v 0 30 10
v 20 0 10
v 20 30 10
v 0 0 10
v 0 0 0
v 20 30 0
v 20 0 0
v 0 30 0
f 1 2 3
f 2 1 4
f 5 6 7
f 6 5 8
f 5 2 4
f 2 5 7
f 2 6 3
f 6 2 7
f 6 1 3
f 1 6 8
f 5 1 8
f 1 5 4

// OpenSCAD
// Parametrik model sablonu — tum olculer burada, mm cinsinden.
// KURAL: kullanicinin verdigi olcuyu degistirme; eksik kritik olcuyu uydurma, sor.

// PARAM: ornek — gercek projede kullanicinin olculeriyle degistir.
ornek_genislik = 20;   // mm (kullanicidan)
ornek_derinlik = 30;   // mm (kullanicidan)
ornek_yukseklik = 10;  // mm (kullanicidan)
duvar = 1.2;           // mm (printers/<yazici>.json -> min_wall_mm ile kontrol et)

$fn = 64;

module govde() {
    cube([ornek_genislik, ornek_derinlik, ornek_yukseklik]);
}

// Baski yonu: en genis duz yuz altta (Z=0). Nedeni README'ye yazilir.
govde();
